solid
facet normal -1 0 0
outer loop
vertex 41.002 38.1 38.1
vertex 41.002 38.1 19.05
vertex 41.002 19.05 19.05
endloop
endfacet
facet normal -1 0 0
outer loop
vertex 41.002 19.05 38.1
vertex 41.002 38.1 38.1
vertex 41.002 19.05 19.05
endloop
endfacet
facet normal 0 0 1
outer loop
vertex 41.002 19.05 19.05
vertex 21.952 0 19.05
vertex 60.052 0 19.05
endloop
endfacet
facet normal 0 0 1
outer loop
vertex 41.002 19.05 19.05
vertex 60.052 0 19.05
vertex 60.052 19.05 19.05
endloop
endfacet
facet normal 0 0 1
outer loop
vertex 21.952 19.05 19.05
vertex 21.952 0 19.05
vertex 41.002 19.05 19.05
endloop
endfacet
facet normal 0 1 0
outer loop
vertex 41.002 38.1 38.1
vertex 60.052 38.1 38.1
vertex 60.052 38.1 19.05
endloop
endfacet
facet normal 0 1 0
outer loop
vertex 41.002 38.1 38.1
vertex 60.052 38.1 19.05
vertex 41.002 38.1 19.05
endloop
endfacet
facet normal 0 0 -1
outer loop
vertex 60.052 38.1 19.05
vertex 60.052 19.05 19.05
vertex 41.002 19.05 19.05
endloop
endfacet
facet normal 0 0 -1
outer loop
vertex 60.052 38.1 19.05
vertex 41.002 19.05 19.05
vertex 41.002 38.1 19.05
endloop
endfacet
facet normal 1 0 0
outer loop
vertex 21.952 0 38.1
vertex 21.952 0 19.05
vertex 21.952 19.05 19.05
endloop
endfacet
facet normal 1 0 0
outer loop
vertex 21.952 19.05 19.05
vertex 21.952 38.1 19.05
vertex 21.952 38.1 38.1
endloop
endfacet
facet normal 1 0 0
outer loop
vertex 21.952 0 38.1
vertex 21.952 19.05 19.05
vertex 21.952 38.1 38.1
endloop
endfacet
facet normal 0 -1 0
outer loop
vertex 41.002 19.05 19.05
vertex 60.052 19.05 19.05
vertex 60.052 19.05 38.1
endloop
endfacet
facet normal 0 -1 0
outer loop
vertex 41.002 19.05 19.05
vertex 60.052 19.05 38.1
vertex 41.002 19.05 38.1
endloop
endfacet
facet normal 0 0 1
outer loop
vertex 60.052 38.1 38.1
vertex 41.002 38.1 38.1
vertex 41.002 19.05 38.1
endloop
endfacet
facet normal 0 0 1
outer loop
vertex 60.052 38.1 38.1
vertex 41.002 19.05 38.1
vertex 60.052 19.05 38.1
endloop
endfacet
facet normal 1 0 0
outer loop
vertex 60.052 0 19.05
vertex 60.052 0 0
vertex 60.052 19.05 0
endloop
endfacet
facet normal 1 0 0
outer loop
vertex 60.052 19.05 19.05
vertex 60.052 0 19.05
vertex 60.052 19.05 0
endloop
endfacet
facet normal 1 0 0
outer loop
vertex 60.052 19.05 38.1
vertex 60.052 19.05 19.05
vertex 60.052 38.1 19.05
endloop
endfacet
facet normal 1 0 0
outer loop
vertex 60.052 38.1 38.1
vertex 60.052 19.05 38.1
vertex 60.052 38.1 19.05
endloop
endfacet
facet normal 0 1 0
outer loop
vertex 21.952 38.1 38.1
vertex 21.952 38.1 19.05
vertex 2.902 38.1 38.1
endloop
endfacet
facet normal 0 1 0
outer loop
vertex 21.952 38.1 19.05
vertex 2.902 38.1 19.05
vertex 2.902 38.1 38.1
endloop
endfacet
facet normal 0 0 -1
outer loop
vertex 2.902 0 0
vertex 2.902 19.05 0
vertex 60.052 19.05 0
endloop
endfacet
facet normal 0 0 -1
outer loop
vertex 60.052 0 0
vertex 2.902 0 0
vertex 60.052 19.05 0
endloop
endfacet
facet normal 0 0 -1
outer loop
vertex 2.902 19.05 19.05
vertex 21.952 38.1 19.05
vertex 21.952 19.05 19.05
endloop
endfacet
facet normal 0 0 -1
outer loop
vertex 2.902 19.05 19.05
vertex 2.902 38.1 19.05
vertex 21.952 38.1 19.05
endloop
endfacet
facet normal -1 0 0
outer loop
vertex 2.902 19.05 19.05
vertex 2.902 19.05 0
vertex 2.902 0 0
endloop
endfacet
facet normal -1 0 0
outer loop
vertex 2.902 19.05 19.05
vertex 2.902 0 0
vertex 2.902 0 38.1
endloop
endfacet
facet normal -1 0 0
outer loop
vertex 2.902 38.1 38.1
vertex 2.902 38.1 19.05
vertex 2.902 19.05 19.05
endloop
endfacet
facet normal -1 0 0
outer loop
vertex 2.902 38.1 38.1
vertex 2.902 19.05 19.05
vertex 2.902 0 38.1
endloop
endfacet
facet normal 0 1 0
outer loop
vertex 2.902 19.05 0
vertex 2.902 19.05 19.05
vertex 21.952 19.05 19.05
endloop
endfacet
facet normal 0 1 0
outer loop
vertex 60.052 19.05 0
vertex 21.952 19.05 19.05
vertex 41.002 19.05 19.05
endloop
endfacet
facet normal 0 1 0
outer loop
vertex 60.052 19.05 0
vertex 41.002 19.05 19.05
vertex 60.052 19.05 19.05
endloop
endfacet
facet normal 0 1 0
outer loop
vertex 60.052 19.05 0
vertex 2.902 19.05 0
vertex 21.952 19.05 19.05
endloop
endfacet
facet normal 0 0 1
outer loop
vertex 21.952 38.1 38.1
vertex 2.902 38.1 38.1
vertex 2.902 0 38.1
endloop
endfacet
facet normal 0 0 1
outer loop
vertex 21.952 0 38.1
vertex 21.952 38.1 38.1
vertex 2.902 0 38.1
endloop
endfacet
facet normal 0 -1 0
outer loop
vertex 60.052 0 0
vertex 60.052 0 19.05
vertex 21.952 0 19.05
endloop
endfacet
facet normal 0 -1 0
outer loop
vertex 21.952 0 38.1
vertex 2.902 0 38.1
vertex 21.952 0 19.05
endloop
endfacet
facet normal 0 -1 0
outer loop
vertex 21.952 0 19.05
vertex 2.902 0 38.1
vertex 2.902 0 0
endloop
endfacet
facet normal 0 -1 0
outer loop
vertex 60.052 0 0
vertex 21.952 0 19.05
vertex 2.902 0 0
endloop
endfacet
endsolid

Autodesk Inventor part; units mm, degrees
ref_plane "YZ Plane" through (0, 0, 0) normal (1, 0, 0) x (0, 1, 0)
ref_plane "XZ Plane" through (0, 0, 0) normal (0, 1, 0) x (-1, 0, 0)
ref_plane "XY Plane" through (0, 0, 0) normal (0, 0, 1) x (1, 0, 0)
sketch "Sketch1" plane through (0, 0, 0) normal (0, 0, 1) x (1, 0, 0)
  line L0 (2.9023, 19.05) -> (41.0023, 19.05)
  line L1 (60.0523, 16.2003) -> (60.0523, 0)
  line L2 (60.0523, 0) -> (2.9023, 0)
  line L3 (2.9023, 0) -> (2.9023, 19.05)
  line L4 (42.0303, 0) -> (60.0523, 0)
  line L5 (60.0523, 0) -> (60.0523, 38.1)
  line L6 (60.0523, 38.1) -> (41.0023, 38.1)
  line L7 (41.0023, 38.1) -> (41.0023, 19.05)
  point P0 (0, 0)
  dimension "d0" = 57.15
  dimension "d1" = 38.1
  dimension "d2" = 19.05
  dimension "d3" = 38.1
  dimension "d4" = 19.05
extrude "Extrusion1" add sketch "Sketch1" along normal blind 19.05
sketch "Sketch2" plane through (0, 0, 19.05) normal (0, 0, 1) x (1, 0, 0)
  line L0 (60.0523, 38.1) -> (41.0023, 38.1) projected
  line L1 (60.0523, 0) -> (60.0523, 38.1) projected
  line L2 (41.0023, 38.1) -> (60.0523, 38.1)
  line L3 (60.0523, 38.1) -> (60.0523, 19.05)
  line L4 (60.0523, 19.05) -> (41.0023, 19.05)
  line L5 (41.0023, 19.05) -> (41.0023, 38.1)
  point P0 (0, 0)
extrude "Extrusion2" add sketch "Sketch2" along normal blind 19.05
sketch "Sketch3" plane through (2.9023, 0, 0) normal (-1, 0, 0) x (0, 0, 1)
  line L0 (19.05, 19.05) -> (19.05, 0) projected
  line L1 (0, 38.1) -> (38.1, 38.1) projected
  line L2 (19.05, 0) -> (38.1, 0)
  line L3 (38.1, 0) -> (38.1, 38.1)
  line L4 (38.1, 38.1) -> (19.05, 38.1)
  line L5 (19.05, 38.1) -> (19.05, 0)
  point P0 (0, 0)
extrude "Extrusion3" add sketch "Sketch3" against normal blind 19.05
sketch "Sketch4" plane through (2.9023, 0, 0) normal (-1, 0, 0) x (0, 0, 1)
  line L0 (0, 0) -> (38.1, 0) projected
  line L1 (0, 19.05) -> (19.05, 19.05) projected
  line L2 (38.1, 0) -> (19.05, 0)
  line L3 (19.05, 0) -> (19.05, 19.05)
  line L4 (19.05, 19.05) -> (38.1, 19.05)
  line L5 (38.1, 19.05) -> (38.1, 0)
extrude "Extrusion4" cut sketch "Sketch4" against normal blind 19.05
sketch "Sketch5" plane through (60.0523, 0, 0) normal (1, 0, 0) x (0, 0, -1)
  line L0 (-19.05, 19.05) -> (-19.05, 38.1) projected
  line L1 (0, 38.1) -> (0, 0) projected
  line L2 (-19.05, 38.1) -> (0, 38.1)
  line L3 (0, 38.1) -> (0, 19.05)
  line L4 (0, 19.05) -> (-19.05, 19.05)
  line L5 (-19.05, 19.05) -> (-19.05, 38.1)
extrude "Extrusion5" cut sketch "Sketch5" against normal blind 20.6375
sketch "Sketch6" plane through (2.9023, 38.1, 19.05) normal (-1, 0, 0) x (0, 0, 1)
  line L0 (-19.05, -19.05) -> (0, -19.05) projected
  line L1 (0, -19.05) -> (19.05, -19.05)
  line L2 (19.05, -19.05) -> (19.05, -38.1)
  line L3 (19.05, -38.1) -> (0, -38.1)
  line L4 (0, -38.1) -> (0, -19.05)
  point P0 (-19.05, -38.1)
  dimension "d15" = 19.05
  dimension "d16" = 19.05
extrude "Extrusion6" add sketch "Sketch6" against normal blind 19.05
properties part number "Dark Blue Part" material "Wood (Maple)"
